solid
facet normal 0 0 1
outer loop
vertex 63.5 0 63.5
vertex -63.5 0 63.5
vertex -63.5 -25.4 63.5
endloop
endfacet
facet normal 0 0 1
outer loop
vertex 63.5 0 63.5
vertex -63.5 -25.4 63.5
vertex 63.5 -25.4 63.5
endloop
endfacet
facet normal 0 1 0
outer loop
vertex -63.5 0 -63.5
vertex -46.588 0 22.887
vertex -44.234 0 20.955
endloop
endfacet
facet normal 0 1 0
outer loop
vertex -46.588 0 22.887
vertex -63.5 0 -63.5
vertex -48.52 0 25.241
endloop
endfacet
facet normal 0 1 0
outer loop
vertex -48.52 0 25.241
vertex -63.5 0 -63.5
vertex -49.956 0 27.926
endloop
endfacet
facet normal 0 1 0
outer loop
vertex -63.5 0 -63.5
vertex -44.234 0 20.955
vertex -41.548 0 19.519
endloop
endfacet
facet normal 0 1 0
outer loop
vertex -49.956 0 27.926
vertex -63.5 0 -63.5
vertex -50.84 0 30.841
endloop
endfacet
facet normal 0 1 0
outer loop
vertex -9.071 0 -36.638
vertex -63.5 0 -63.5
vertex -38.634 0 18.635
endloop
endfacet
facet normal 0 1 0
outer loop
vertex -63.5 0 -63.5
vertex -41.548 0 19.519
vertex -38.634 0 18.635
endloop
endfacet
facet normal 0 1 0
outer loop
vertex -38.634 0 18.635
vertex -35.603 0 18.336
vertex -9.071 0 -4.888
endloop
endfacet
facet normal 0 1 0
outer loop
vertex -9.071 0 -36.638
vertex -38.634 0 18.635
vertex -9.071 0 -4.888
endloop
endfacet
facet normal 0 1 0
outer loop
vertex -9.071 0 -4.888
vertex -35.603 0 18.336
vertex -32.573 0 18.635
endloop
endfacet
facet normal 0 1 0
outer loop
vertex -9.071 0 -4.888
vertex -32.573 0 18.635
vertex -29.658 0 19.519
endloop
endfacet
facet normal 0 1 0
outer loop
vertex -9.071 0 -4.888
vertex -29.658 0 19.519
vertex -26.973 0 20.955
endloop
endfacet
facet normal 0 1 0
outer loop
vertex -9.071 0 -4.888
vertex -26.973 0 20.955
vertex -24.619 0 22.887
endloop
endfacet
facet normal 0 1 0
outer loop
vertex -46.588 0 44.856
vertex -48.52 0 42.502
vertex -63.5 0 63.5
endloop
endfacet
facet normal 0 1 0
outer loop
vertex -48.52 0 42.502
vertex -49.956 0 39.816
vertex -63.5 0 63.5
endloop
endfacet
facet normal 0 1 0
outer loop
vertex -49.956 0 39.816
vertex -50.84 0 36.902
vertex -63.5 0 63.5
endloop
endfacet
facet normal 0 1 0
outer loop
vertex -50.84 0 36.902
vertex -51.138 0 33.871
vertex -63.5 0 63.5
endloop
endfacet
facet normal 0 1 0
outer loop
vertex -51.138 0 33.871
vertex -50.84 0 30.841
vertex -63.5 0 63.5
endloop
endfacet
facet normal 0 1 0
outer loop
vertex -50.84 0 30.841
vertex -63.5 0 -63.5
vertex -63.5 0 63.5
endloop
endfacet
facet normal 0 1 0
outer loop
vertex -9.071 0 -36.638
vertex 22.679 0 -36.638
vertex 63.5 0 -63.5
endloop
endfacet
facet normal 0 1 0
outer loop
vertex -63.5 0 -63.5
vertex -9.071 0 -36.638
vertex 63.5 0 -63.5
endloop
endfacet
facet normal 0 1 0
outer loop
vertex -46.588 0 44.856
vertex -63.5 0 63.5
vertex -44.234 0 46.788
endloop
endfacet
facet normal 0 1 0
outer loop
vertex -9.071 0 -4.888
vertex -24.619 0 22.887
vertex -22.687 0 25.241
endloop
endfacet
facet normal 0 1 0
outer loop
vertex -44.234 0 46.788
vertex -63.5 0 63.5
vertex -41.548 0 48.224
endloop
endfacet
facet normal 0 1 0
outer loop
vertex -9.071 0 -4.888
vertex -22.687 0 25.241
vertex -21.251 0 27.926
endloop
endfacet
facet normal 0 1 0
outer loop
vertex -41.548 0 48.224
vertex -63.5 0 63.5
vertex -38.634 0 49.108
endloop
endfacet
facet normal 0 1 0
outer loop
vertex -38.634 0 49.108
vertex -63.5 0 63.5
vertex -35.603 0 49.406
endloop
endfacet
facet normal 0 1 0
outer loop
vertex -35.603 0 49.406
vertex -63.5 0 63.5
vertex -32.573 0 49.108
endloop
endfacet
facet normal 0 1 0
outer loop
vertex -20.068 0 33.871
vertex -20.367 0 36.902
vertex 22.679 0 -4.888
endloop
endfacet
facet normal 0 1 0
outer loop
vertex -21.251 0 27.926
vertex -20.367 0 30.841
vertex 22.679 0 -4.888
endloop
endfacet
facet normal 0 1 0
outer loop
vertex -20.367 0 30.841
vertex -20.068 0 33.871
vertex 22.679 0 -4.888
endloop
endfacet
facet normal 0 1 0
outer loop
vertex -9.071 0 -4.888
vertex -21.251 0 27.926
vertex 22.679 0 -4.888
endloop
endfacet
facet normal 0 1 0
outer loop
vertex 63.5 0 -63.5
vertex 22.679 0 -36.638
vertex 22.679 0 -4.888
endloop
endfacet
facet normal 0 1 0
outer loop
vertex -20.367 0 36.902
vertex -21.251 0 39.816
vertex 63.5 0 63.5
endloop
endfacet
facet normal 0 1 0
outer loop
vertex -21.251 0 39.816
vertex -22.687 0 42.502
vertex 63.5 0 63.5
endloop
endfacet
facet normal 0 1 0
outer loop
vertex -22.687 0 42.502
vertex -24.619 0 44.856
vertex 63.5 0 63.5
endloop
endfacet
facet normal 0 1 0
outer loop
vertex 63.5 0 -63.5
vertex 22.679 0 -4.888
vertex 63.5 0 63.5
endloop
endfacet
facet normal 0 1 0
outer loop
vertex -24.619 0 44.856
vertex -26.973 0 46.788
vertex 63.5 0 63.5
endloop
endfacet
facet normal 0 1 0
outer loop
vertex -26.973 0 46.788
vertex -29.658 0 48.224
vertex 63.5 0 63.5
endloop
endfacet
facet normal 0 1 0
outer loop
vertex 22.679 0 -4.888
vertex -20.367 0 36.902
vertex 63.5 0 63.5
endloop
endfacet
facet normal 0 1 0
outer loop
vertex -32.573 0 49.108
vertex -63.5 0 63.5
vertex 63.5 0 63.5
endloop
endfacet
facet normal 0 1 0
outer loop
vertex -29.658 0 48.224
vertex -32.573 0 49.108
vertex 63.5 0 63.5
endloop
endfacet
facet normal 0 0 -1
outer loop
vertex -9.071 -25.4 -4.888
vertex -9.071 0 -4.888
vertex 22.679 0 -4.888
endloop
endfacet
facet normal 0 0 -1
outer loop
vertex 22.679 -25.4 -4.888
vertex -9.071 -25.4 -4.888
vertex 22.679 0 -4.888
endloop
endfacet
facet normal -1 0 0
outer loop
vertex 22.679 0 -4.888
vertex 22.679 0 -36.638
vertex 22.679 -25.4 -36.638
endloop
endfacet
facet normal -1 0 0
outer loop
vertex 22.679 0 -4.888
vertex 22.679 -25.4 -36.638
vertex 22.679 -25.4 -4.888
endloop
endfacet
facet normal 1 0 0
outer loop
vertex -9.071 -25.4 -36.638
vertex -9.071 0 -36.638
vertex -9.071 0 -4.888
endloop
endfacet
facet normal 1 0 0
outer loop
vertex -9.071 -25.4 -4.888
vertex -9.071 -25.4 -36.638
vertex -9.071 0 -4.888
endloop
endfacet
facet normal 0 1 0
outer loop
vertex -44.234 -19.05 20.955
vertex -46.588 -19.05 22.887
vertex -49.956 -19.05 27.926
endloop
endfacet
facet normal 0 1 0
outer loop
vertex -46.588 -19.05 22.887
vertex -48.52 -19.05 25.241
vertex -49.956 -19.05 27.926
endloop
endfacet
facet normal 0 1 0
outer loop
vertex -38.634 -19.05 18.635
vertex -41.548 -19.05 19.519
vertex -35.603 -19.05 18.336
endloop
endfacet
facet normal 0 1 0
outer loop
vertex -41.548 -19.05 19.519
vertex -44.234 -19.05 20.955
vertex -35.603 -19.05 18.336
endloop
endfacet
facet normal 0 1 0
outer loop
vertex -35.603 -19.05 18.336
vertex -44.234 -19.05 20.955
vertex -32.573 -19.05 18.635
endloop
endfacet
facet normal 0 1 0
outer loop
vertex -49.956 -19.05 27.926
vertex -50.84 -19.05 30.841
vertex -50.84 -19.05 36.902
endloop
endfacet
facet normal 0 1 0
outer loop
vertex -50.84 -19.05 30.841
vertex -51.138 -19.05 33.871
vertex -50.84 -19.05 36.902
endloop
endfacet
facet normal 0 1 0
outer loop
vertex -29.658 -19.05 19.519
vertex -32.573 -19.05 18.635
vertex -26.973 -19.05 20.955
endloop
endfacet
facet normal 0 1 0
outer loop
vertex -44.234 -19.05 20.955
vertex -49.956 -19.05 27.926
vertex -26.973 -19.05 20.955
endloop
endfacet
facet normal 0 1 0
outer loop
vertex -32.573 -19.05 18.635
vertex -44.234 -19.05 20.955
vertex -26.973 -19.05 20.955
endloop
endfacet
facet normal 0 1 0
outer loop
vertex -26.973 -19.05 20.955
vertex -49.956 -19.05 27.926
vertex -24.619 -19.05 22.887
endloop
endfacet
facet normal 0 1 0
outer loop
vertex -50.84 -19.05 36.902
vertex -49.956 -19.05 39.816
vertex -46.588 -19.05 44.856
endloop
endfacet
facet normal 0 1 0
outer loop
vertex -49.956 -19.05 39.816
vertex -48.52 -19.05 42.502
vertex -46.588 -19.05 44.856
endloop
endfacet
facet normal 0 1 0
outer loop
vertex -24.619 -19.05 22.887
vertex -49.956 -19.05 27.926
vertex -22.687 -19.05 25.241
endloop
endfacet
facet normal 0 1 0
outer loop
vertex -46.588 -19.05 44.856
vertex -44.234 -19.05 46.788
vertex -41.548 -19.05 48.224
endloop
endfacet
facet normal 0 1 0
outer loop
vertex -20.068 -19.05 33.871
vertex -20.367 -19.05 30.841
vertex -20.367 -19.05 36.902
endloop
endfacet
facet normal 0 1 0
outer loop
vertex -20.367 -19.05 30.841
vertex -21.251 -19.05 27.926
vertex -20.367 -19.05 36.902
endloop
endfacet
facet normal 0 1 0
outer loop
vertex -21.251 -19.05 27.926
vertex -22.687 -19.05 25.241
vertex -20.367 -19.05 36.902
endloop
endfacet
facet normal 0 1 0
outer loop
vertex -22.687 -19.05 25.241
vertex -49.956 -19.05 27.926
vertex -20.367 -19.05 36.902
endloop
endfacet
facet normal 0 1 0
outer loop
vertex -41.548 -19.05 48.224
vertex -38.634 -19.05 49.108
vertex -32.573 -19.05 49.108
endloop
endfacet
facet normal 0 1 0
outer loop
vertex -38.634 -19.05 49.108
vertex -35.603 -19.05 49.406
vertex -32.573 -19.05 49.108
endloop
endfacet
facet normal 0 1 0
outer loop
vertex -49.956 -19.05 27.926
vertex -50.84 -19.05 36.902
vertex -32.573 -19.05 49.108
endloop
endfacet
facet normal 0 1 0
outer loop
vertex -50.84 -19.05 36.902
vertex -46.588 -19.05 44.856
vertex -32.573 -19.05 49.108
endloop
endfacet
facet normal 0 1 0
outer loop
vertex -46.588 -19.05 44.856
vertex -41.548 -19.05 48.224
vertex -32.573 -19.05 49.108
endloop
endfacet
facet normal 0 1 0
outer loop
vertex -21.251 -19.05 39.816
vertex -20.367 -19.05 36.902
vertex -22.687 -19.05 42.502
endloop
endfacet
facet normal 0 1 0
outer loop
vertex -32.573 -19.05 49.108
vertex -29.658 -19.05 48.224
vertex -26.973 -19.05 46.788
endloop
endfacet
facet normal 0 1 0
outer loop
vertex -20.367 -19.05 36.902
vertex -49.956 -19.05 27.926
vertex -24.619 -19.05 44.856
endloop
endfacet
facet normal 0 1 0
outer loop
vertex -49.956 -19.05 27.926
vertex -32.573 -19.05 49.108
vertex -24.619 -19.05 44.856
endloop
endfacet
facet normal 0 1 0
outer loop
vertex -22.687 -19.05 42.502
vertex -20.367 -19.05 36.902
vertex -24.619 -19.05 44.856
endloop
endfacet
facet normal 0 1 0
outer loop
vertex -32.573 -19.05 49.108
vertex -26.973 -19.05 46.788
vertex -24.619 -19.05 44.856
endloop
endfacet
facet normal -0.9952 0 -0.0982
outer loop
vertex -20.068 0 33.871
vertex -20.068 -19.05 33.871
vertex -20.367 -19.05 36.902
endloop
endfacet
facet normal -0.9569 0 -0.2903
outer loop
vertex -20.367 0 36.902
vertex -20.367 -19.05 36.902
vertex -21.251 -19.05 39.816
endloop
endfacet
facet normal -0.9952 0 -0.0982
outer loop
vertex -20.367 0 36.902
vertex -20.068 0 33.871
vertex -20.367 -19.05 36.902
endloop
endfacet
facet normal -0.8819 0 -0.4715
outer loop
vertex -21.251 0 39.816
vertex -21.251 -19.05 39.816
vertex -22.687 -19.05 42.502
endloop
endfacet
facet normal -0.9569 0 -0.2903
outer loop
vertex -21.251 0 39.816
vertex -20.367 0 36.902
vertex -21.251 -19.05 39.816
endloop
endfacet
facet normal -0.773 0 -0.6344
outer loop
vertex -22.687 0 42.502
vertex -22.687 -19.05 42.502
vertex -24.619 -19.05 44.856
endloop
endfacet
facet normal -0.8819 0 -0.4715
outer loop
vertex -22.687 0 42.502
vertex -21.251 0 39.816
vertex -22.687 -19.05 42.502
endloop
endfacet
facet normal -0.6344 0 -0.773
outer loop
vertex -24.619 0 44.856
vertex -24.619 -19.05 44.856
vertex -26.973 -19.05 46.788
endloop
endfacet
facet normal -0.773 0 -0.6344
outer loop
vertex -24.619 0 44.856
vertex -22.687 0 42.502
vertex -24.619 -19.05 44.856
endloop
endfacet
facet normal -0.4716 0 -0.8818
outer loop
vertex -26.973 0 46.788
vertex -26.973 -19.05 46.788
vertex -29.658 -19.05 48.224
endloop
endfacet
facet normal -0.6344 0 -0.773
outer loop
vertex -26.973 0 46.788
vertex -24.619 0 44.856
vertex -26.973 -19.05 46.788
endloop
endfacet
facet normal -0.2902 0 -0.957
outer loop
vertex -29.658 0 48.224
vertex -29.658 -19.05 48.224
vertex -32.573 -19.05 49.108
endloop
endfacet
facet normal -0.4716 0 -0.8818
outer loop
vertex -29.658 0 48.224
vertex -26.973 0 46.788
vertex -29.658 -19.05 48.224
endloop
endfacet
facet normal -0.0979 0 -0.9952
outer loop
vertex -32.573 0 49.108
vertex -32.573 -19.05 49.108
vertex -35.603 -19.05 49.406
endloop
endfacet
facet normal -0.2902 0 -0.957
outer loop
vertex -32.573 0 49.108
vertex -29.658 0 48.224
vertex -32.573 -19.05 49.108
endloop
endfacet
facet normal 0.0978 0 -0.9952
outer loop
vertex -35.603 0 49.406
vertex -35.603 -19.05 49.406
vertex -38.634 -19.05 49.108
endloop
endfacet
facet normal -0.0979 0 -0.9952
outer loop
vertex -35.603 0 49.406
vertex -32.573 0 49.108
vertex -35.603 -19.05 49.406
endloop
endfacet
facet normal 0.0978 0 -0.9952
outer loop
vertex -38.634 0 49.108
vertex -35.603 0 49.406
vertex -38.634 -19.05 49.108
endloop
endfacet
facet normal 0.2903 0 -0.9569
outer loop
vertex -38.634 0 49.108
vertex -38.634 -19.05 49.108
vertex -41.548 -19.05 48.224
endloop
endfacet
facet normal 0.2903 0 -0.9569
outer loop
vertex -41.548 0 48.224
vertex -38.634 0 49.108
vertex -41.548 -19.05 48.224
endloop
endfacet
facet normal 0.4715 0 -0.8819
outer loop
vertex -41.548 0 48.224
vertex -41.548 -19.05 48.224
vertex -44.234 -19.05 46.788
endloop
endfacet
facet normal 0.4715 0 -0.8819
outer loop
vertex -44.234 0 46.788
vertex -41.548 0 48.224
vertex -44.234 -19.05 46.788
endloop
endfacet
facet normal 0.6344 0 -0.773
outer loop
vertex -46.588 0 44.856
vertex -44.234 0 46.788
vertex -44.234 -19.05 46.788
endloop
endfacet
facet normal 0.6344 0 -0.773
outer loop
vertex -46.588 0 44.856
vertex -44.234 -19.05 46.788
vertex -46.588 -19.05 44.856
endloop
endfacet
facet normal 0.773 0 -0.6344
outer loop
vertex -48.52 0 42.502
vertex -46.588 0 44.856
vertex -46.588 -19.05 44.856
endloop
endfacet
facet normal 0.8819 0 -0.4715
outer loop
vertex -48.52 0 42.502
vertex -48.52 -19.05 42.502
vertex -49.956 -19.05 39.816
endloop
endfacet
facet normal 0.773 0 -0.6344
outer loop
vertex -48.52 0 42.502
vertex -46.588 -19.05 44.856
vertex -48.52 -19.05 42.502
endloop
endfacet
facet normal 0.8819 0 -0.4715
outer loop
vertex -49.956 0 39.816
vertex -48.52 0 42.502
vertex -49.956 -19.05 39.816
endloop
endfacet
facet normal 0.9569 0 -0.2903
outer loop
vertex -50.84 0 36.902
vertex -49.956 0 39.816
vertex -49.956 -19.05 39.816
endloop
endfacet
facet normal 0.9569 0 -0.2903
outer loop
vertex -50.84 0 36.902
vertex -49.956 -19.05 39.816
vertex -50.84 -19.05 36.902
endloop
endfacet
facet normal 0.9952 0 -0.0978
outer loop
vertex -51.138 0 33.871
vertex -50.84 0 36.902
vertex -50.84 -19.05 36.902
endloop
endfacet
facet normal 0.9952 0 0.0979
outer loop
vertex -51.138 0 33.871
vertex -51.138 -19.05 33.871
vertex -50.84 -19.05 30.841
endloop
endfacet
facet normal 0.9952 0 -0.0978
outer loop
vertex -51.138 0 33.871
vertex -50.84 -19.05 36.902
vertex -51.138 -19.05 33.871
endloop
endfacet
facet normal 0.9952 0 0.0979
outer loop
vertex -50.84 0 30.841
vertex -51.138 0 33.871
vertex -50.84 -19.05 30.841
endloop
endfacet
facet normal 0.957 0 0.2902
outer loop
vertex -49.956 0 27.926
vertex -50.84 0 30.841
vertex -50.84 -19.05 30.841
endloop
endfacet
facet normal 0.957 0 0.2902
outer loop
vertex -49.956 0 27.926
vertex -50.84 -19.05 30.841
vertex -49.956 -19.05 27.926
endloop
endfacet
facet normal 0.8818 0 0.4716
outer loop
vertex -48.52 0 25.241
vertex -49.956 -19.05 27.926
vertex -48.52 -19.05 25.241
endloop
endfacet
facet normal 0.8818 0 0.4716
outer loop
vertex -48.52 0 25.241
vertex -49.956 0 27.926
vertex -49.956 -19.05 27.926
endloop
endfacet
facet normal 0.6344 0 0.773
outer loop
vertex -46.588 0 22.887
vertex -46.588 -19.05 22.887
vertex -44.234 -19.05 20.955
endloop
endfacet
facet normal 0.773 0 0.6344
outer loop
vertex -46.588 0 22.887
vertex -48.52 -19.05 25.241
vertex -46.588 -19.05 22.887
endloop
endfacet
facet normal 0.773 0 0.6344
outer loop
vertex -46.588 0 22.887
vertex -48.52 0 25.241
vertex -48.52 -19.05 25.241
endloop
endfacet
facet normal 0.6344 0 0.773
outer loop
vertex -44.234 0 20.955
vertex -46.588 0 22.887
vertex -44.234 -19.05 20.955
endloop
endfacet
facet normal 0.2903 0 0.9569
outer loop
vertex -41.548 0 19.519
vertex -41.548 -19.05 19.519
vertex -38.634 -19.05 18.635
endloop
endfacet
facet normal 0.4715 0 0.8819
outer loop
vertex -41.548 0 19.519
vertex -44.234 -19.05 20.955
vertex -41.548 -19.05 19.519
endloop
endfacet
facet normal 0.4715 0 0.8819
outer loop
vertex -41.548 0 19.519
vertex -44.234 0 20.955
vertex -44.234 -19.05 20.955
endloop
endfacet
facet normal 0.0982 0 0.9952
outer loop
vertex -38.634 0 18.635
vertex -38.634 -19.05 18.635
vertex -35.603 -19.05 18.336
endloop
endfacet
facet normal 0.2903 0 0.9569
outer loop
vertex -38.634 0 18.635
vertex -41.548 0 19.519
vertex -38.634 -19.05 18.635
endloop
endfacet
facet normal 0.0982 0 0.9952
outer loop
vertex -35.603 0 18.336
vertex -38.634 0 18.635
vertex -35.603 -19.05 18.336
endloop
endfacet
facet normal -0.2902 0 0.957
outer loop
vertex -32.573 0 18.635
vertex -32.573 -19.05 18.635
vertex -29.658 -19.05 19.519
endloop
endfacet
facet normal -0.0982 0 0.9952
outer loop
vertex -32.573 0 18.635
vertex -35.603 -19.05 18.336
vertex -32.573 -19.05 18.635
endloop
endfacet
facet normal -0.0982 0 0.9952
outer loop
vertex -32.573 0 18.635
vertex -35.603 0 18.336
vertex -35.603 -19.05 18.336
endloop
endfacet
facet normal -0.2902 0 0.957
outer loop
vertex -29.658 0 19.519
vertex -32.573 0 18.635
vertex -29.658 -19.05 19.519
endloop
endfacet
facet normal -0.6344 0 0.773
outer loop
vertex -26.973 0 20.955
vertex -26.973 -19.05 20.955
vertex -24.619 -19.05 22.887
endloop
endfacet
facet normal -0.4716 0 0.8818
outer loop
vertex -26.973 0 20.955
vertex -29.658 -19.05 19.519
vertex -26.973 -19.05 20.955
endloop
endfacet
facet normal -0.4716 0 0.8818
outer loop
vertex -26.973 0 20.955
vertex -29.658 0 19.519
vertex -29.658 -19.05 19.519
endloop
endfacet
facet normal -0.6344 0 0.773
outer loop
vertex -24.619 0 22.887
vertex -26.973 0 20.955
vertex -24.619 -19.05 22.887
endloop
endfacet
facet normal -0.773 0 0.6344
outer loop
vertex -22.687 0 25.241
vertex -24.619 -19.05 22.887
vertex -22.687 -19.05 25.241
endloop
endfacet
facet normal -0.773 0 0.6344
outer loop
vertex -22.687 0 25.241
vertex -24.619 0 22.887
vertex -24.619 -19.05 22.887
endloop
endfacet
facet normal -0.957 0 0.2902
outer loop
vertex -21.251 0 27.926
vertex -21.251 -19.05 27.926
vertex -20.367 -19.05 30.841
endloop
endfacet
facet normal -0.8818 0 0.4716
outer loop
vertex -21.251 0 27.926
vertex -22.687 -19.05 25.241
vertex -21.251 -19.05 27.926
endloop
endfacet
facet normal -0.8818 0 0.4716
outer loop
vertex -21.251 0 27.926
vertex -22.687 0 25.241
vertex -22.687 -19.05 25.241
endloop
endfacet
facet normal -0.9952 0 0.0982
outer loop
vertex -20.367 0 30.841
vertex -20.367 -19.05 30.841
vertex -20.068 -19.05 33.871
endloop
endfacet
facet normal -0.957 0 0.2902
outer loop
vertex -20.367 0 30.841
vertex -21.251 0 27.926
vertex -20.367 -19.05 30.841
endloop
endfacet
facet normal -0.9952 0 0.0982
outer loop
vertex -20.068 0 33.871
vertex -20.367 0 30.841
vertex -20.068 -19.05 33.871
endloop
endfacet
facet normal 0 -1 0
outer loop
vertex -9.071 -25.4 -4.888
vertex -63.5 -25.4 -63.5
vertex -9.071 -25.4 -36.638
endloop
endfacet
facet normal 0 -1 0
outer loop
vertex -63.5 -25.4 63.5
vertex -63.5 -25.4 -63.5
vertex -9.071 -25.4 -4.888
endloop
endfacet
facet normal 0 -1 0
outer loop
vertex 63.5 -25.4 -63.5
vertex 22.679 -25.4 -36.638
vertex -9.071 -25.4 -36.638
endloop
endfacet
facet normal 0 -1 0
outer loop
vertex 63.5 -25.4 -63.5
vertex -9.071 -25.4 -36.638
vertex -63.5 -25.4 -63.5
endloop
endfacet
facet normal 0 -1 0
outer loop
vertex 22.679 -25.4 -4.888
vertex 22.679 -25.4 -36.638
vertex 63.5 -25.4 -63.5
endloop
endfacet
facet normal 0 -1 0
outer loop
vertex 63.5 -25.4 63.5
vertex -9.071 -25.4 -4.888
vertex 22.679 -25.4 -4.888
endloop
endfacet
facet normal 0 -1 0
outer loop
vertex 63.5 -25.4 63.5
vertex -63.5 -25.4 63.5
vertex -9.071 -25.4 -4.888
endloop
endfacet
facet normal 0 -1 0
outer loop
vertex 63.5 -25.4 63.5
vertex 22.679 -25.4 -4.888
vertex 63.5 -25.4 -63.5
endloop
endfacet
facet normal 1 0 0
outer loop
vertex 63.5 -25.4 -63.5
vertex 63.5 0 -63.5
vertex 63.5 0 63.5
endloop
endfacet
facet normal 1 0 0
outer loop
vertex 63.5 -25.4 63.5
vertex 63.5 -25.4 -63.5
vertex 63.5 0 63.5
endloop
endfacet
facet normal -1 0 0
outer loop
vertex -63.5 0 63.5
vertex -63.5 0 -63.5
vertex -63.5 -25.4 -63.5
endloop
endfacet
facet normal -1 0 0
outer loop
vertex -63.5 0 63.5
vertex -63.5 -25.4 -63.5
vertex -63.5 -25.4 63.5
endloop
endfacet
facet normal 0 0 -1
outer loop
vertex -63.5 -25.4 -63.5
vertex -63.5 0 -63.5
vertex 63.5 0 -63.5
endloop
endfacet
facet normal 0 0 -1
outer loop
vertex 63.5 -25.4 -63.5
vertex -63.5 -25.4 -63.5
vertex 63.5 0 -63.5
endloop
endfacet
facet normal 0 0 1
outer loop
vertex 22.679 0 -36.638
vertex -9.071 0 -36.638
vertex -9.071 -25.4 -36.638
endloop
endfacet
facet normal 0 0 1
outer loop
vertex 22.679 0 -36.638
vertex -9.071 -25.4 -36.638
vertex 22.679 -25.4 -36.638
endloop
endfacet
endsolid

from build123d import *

# Parameters (mm, degrees)
F0_W     = 127
F0_H     = 127
F0_W_2   = 31.75
F0_H_2   = 31.75
F0_R     = 15.534992
F1_DEPTH = 25.4
F2_R     = 23.88256
F3_DEPTH = 6.35
F4_DEPTH = 25.4
F6_R     = 25.357693
F7_DEPTH = 6.35


with BuildPart() as f1:
    # F0 (on Front) → F1 (new body)
    with BuildSketch(Plane.XZ):
        Rectangle(F0_W, F0_H)
        with Locations((6.803889, -20.762809)):
            Rectangle(F0_W_2, F0_H_2, mode=Mode.SUBTRACT)
        with Locations((-35.603467, 33.871405)):
            Circle(F0_R, mode=Mode.SUBTRACT)
    extrude(amount=F1_DEPTH)

    # F2 (on face) → F3 (cut)
    with BuildSketch(Plane.XZ.offset(25.4)):
        with Locations((-35.603467, 33.871405)):
            Circle(F2_R)
    extrude(amount=-F3_DEPTH, mode=Mode.SUBTRACT)

    # F0 (on Front) → F4 (join)
    with BuildSketch(Plane.XZ):
        Rectangle(F0_W, F0_H)
        with Locations((6.803889, -20.762809)):
            Rectangle(F0_W_2, F0_H_2, mode=Mode.SUBTRACT)
        with Locations((-35.603467, 33.871405)):
            Circle(F0_R, mode=Mode.SUBTRACT)
    extrude(amount=F4_DEPTH)

    # F6 (on face) → F7 (join)
    with BuildSketch(Plane.XZ.offset(25.4)):
        with Locations((-35.603467, 33.871405)):
            Circle(F6_R)
    extrude(amount=-F7_DEPTH)


solid = f1.part
